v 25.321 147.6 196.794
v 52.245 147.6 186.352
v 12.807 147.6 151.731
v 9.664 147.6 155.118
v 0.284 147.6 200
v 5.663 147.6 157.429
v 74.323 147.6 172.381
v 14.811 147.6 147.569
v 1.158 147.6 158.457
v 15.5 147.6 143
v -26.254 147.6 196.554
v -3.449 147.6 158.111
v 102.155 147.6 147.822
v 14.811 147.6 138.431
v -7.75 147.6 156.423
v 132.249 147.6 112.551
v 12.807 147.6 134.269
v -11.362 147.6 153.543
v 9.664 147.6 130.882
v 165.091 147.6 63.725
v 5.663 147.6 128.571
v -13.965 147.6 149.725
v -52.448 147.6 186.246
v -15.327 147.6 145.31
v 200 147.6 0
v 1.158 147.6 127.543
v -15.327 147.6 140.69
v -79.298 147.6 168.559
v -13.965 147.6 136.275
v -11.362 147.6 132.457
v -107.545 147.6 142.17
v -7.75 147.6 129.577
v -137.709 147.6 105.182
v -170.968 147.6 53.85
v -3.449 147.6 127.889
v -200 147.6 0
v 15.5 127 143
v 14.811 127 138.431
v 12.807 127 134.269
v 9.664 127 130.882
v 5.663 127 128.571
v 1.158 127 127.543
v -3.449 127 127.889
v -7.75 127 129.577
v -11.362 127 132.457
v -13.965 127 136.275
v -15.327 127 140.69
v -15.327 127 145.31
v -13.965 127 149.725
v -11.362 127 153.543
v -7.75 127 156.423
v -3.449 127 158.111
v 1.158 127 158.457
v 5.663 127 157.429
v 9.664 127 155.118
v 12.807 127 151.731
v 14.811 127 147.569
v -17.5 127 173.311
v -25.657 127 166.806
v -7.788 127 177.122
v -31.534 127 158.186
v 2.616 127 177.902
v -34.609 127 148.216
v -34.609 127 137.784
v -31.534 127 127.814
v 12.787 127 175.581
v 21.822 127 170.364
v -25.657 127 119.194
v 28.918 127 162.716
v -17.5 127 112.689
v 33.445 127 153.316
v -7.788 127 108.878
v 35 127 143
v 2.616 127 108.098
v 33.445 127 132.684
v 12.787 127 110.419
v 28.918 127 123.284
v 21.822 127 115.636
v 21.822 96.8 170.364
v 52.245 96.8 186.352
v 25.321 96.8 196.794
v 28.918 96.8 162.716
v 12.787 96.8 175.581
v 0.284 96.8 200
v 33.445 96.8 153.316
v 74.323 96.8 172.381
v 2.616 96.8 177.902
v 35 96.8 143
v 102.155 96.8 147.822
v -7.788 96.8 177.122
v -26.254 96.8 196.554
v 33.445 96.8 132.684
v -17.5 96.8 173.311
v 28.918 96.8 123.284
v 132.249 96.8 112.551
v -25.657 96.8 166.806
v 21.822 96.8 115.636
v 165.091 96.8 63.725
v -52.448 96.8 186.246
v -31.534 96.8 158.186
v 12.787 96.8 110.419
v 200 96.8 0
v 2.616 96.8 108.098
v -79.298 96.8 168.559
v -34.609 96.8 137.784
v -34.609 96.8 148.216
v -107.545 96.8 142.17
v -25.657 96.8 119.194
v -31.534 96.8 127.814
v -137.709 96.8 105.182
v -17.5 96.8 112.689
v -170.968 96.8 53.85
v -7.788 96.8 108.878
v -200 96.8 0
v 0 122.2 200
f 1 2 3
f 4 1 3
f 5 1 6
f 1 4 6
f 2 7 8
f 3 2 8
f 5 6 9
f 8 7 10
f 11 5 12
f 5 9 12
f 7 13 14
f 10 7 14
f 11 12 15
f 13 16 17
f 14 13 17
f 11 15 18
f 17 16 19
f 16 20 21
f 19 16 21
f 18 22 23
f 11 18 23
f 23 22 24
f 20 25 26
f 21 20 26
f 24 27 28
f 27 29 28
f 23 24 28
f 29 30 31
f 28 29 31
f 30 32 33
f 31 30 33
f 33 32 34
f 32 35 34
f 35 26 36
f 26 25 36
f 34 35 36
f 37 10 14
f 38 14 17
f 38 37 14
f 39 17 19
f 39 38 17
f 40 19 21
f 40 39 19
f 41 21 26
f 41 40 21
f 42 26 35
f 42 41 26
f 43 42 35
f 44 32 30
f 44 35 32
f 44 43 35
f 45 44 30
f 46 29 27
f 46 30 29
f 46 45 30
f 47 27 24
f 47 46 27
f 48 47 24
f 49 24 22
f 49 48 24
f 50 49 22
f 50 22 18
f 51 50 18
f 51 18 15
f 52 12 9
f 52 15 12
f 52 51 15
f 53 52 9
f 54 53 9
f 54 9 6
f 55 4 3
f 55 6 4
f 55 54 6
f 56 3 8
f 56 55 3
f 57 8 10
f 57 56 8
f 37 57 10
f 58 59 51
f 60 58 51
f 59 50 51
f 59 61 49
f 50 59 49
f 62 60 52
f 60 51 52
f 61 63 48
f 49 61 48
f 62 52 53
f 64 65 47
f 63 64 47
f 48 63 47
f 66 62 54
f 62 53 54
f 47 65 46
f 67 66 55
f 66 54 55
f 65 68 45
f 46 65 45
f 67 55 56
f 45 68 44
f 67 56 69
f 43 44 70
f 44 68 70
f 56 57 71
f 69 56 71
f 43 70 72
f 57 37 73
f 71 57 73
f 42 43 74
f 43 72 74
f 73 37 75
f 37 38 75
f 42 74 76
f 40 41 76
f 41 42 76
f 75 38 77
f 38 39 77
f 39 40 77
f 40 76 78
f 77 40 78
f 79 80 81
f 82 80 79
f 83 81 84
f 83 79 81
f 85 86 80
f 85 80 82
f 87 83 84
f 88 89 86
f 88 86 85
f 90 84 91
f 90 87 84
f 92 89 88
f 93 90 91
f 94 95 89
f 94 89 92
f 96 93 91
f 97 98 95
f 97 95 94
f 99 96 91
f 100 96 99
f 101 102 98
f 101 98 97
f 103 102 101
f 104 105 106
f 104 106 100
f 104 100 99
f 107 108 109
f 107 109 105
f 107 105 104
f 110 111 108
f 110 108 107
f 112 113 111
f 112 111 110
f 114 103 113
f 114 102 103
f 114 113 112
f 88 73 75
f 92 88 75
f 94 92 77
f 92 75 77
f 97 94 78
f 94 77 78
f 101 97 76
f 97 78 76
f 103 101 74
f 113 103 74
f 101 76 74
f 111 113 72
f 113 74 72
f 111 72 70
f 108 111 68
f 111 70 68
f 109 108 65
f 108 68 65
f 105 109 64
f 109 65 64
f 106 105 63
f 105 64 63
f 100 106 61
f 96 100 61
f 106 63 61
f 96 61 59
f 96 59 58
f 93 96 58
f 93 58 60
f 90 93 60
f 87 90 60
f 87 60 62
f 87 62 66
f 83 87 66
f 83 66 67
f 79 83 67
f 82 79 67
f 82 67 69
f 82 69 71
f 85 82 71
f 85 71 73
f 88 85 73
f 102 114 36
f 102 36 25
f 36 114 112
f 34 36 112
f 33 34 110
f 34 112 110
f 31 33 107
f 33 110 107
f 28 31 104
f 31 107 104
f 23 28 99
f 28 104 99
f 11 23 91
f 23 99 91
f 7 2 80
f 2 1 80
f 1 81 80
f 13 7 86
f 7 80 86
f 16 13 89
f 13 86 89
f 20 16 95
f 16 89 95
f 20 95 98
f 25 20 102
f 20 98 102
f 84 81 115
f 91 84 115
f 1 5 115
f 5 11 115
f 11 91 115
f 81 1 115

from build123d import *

# Parameters (mm, degrees)
BOSS_EXTRUDE1_DEPTH     = 300
SKETCH3_R               = 15.5
CUT_EXTRUDE1_DEPTH      = 23
CUT_EXTRUDE1_DEPTH_BACK = 23
SKETCH4_R               = 35
CUT_EXTRUDE3_DEPTH      = 300
SKETCH5_W               = 488.913893014
SKETCH5_H               = 228.614771509
SKETCH5_W_2             = 496.713117629
SKETCH5_H_2             = 107.726789986
CUT_EXTRUDE4_DEPTH      = 201.0000001


with BuildPart() as part:
    # Sketch1 → Boss-Extrude1 (new body)
    with BuildSketch(Plane(origin=(0, 0, 0), x_dir=(1, 0, 0), z_dir=(0, 1, 0))):
        with BuildLine():
            Line((-200, 1e-09), (200, 1e-09))
            add(Edge.make_bspline(
                [(-200, 1e-09), (0, -400.000000001), (200, 1e-09)],
                knots=[0.056028396, 0.056028396, 0.056028396, 0.943971604, 0.943971604, 0.943971604], degree=2))
        make_face()
    extrude(amount=BOSS_EXTRUDE1_DEPTH)

    # Sketch3 → Cut-Extrude1 (cut, two sides)
    with BuildSketch(Plane(origin=(0, 150, 0), x_dir=(1, 0, 0), z_dir=(0, 1, 0))) as cut_extrude1_sk:
        with Locations((0, -142.999999999)):
            Circle(SKETCH3_R)
    extrude(amount=CUT_EXTRUDE1_DEPTH, mode=Mode.SUBTRACT)
    extrude(cut_extrude1_sk.sketch, amount=-CUT_EXTRUDE1_DEPTH_BACK, mode=Mode.SUBTRACT)

    # Sketch4 → Cut-Extrude3 (cut)
    with BuildSketch(Plane(origin=(0, 173, 0), x_dir=(1, 0, 0), z_dir=(0, 1, 0))):
        with Locations((0, -142.999999999)):
            Circle(SKETCH4_R)
    cut_extrude3 = extrude(amount=CUT_EXTRUDE3_DEPTH, mode=Mode.SUBTRACT)

    # Mirror1: Cut-Extrude3 across plane
    add(cut_extrude3.mirror(Plane.ZX.offset(150)), mode=Mode.SUBTRACT)

    # Sketch5 → Cut-Extrude4 (cut, through all)
    with BuildSketch(Plane(origin=(0, 0, 0), x_dir=(-1, 0, 0), z_dir=(0, 0, -1))):
        with Locations((-0.974903077, 261.907385755)):
            Rectangle(SKETCH5_W, SKETCH5_H)
        with Locations((2.92470923, 42.936605007)):
            Rectangle(SKETCH5_W_2, SKETCH5_H_2)
    extrude(amount=-CUT_EXTRUDE4_DEPTH, mode=Mode.SUBTRACT)


solid = part.part
